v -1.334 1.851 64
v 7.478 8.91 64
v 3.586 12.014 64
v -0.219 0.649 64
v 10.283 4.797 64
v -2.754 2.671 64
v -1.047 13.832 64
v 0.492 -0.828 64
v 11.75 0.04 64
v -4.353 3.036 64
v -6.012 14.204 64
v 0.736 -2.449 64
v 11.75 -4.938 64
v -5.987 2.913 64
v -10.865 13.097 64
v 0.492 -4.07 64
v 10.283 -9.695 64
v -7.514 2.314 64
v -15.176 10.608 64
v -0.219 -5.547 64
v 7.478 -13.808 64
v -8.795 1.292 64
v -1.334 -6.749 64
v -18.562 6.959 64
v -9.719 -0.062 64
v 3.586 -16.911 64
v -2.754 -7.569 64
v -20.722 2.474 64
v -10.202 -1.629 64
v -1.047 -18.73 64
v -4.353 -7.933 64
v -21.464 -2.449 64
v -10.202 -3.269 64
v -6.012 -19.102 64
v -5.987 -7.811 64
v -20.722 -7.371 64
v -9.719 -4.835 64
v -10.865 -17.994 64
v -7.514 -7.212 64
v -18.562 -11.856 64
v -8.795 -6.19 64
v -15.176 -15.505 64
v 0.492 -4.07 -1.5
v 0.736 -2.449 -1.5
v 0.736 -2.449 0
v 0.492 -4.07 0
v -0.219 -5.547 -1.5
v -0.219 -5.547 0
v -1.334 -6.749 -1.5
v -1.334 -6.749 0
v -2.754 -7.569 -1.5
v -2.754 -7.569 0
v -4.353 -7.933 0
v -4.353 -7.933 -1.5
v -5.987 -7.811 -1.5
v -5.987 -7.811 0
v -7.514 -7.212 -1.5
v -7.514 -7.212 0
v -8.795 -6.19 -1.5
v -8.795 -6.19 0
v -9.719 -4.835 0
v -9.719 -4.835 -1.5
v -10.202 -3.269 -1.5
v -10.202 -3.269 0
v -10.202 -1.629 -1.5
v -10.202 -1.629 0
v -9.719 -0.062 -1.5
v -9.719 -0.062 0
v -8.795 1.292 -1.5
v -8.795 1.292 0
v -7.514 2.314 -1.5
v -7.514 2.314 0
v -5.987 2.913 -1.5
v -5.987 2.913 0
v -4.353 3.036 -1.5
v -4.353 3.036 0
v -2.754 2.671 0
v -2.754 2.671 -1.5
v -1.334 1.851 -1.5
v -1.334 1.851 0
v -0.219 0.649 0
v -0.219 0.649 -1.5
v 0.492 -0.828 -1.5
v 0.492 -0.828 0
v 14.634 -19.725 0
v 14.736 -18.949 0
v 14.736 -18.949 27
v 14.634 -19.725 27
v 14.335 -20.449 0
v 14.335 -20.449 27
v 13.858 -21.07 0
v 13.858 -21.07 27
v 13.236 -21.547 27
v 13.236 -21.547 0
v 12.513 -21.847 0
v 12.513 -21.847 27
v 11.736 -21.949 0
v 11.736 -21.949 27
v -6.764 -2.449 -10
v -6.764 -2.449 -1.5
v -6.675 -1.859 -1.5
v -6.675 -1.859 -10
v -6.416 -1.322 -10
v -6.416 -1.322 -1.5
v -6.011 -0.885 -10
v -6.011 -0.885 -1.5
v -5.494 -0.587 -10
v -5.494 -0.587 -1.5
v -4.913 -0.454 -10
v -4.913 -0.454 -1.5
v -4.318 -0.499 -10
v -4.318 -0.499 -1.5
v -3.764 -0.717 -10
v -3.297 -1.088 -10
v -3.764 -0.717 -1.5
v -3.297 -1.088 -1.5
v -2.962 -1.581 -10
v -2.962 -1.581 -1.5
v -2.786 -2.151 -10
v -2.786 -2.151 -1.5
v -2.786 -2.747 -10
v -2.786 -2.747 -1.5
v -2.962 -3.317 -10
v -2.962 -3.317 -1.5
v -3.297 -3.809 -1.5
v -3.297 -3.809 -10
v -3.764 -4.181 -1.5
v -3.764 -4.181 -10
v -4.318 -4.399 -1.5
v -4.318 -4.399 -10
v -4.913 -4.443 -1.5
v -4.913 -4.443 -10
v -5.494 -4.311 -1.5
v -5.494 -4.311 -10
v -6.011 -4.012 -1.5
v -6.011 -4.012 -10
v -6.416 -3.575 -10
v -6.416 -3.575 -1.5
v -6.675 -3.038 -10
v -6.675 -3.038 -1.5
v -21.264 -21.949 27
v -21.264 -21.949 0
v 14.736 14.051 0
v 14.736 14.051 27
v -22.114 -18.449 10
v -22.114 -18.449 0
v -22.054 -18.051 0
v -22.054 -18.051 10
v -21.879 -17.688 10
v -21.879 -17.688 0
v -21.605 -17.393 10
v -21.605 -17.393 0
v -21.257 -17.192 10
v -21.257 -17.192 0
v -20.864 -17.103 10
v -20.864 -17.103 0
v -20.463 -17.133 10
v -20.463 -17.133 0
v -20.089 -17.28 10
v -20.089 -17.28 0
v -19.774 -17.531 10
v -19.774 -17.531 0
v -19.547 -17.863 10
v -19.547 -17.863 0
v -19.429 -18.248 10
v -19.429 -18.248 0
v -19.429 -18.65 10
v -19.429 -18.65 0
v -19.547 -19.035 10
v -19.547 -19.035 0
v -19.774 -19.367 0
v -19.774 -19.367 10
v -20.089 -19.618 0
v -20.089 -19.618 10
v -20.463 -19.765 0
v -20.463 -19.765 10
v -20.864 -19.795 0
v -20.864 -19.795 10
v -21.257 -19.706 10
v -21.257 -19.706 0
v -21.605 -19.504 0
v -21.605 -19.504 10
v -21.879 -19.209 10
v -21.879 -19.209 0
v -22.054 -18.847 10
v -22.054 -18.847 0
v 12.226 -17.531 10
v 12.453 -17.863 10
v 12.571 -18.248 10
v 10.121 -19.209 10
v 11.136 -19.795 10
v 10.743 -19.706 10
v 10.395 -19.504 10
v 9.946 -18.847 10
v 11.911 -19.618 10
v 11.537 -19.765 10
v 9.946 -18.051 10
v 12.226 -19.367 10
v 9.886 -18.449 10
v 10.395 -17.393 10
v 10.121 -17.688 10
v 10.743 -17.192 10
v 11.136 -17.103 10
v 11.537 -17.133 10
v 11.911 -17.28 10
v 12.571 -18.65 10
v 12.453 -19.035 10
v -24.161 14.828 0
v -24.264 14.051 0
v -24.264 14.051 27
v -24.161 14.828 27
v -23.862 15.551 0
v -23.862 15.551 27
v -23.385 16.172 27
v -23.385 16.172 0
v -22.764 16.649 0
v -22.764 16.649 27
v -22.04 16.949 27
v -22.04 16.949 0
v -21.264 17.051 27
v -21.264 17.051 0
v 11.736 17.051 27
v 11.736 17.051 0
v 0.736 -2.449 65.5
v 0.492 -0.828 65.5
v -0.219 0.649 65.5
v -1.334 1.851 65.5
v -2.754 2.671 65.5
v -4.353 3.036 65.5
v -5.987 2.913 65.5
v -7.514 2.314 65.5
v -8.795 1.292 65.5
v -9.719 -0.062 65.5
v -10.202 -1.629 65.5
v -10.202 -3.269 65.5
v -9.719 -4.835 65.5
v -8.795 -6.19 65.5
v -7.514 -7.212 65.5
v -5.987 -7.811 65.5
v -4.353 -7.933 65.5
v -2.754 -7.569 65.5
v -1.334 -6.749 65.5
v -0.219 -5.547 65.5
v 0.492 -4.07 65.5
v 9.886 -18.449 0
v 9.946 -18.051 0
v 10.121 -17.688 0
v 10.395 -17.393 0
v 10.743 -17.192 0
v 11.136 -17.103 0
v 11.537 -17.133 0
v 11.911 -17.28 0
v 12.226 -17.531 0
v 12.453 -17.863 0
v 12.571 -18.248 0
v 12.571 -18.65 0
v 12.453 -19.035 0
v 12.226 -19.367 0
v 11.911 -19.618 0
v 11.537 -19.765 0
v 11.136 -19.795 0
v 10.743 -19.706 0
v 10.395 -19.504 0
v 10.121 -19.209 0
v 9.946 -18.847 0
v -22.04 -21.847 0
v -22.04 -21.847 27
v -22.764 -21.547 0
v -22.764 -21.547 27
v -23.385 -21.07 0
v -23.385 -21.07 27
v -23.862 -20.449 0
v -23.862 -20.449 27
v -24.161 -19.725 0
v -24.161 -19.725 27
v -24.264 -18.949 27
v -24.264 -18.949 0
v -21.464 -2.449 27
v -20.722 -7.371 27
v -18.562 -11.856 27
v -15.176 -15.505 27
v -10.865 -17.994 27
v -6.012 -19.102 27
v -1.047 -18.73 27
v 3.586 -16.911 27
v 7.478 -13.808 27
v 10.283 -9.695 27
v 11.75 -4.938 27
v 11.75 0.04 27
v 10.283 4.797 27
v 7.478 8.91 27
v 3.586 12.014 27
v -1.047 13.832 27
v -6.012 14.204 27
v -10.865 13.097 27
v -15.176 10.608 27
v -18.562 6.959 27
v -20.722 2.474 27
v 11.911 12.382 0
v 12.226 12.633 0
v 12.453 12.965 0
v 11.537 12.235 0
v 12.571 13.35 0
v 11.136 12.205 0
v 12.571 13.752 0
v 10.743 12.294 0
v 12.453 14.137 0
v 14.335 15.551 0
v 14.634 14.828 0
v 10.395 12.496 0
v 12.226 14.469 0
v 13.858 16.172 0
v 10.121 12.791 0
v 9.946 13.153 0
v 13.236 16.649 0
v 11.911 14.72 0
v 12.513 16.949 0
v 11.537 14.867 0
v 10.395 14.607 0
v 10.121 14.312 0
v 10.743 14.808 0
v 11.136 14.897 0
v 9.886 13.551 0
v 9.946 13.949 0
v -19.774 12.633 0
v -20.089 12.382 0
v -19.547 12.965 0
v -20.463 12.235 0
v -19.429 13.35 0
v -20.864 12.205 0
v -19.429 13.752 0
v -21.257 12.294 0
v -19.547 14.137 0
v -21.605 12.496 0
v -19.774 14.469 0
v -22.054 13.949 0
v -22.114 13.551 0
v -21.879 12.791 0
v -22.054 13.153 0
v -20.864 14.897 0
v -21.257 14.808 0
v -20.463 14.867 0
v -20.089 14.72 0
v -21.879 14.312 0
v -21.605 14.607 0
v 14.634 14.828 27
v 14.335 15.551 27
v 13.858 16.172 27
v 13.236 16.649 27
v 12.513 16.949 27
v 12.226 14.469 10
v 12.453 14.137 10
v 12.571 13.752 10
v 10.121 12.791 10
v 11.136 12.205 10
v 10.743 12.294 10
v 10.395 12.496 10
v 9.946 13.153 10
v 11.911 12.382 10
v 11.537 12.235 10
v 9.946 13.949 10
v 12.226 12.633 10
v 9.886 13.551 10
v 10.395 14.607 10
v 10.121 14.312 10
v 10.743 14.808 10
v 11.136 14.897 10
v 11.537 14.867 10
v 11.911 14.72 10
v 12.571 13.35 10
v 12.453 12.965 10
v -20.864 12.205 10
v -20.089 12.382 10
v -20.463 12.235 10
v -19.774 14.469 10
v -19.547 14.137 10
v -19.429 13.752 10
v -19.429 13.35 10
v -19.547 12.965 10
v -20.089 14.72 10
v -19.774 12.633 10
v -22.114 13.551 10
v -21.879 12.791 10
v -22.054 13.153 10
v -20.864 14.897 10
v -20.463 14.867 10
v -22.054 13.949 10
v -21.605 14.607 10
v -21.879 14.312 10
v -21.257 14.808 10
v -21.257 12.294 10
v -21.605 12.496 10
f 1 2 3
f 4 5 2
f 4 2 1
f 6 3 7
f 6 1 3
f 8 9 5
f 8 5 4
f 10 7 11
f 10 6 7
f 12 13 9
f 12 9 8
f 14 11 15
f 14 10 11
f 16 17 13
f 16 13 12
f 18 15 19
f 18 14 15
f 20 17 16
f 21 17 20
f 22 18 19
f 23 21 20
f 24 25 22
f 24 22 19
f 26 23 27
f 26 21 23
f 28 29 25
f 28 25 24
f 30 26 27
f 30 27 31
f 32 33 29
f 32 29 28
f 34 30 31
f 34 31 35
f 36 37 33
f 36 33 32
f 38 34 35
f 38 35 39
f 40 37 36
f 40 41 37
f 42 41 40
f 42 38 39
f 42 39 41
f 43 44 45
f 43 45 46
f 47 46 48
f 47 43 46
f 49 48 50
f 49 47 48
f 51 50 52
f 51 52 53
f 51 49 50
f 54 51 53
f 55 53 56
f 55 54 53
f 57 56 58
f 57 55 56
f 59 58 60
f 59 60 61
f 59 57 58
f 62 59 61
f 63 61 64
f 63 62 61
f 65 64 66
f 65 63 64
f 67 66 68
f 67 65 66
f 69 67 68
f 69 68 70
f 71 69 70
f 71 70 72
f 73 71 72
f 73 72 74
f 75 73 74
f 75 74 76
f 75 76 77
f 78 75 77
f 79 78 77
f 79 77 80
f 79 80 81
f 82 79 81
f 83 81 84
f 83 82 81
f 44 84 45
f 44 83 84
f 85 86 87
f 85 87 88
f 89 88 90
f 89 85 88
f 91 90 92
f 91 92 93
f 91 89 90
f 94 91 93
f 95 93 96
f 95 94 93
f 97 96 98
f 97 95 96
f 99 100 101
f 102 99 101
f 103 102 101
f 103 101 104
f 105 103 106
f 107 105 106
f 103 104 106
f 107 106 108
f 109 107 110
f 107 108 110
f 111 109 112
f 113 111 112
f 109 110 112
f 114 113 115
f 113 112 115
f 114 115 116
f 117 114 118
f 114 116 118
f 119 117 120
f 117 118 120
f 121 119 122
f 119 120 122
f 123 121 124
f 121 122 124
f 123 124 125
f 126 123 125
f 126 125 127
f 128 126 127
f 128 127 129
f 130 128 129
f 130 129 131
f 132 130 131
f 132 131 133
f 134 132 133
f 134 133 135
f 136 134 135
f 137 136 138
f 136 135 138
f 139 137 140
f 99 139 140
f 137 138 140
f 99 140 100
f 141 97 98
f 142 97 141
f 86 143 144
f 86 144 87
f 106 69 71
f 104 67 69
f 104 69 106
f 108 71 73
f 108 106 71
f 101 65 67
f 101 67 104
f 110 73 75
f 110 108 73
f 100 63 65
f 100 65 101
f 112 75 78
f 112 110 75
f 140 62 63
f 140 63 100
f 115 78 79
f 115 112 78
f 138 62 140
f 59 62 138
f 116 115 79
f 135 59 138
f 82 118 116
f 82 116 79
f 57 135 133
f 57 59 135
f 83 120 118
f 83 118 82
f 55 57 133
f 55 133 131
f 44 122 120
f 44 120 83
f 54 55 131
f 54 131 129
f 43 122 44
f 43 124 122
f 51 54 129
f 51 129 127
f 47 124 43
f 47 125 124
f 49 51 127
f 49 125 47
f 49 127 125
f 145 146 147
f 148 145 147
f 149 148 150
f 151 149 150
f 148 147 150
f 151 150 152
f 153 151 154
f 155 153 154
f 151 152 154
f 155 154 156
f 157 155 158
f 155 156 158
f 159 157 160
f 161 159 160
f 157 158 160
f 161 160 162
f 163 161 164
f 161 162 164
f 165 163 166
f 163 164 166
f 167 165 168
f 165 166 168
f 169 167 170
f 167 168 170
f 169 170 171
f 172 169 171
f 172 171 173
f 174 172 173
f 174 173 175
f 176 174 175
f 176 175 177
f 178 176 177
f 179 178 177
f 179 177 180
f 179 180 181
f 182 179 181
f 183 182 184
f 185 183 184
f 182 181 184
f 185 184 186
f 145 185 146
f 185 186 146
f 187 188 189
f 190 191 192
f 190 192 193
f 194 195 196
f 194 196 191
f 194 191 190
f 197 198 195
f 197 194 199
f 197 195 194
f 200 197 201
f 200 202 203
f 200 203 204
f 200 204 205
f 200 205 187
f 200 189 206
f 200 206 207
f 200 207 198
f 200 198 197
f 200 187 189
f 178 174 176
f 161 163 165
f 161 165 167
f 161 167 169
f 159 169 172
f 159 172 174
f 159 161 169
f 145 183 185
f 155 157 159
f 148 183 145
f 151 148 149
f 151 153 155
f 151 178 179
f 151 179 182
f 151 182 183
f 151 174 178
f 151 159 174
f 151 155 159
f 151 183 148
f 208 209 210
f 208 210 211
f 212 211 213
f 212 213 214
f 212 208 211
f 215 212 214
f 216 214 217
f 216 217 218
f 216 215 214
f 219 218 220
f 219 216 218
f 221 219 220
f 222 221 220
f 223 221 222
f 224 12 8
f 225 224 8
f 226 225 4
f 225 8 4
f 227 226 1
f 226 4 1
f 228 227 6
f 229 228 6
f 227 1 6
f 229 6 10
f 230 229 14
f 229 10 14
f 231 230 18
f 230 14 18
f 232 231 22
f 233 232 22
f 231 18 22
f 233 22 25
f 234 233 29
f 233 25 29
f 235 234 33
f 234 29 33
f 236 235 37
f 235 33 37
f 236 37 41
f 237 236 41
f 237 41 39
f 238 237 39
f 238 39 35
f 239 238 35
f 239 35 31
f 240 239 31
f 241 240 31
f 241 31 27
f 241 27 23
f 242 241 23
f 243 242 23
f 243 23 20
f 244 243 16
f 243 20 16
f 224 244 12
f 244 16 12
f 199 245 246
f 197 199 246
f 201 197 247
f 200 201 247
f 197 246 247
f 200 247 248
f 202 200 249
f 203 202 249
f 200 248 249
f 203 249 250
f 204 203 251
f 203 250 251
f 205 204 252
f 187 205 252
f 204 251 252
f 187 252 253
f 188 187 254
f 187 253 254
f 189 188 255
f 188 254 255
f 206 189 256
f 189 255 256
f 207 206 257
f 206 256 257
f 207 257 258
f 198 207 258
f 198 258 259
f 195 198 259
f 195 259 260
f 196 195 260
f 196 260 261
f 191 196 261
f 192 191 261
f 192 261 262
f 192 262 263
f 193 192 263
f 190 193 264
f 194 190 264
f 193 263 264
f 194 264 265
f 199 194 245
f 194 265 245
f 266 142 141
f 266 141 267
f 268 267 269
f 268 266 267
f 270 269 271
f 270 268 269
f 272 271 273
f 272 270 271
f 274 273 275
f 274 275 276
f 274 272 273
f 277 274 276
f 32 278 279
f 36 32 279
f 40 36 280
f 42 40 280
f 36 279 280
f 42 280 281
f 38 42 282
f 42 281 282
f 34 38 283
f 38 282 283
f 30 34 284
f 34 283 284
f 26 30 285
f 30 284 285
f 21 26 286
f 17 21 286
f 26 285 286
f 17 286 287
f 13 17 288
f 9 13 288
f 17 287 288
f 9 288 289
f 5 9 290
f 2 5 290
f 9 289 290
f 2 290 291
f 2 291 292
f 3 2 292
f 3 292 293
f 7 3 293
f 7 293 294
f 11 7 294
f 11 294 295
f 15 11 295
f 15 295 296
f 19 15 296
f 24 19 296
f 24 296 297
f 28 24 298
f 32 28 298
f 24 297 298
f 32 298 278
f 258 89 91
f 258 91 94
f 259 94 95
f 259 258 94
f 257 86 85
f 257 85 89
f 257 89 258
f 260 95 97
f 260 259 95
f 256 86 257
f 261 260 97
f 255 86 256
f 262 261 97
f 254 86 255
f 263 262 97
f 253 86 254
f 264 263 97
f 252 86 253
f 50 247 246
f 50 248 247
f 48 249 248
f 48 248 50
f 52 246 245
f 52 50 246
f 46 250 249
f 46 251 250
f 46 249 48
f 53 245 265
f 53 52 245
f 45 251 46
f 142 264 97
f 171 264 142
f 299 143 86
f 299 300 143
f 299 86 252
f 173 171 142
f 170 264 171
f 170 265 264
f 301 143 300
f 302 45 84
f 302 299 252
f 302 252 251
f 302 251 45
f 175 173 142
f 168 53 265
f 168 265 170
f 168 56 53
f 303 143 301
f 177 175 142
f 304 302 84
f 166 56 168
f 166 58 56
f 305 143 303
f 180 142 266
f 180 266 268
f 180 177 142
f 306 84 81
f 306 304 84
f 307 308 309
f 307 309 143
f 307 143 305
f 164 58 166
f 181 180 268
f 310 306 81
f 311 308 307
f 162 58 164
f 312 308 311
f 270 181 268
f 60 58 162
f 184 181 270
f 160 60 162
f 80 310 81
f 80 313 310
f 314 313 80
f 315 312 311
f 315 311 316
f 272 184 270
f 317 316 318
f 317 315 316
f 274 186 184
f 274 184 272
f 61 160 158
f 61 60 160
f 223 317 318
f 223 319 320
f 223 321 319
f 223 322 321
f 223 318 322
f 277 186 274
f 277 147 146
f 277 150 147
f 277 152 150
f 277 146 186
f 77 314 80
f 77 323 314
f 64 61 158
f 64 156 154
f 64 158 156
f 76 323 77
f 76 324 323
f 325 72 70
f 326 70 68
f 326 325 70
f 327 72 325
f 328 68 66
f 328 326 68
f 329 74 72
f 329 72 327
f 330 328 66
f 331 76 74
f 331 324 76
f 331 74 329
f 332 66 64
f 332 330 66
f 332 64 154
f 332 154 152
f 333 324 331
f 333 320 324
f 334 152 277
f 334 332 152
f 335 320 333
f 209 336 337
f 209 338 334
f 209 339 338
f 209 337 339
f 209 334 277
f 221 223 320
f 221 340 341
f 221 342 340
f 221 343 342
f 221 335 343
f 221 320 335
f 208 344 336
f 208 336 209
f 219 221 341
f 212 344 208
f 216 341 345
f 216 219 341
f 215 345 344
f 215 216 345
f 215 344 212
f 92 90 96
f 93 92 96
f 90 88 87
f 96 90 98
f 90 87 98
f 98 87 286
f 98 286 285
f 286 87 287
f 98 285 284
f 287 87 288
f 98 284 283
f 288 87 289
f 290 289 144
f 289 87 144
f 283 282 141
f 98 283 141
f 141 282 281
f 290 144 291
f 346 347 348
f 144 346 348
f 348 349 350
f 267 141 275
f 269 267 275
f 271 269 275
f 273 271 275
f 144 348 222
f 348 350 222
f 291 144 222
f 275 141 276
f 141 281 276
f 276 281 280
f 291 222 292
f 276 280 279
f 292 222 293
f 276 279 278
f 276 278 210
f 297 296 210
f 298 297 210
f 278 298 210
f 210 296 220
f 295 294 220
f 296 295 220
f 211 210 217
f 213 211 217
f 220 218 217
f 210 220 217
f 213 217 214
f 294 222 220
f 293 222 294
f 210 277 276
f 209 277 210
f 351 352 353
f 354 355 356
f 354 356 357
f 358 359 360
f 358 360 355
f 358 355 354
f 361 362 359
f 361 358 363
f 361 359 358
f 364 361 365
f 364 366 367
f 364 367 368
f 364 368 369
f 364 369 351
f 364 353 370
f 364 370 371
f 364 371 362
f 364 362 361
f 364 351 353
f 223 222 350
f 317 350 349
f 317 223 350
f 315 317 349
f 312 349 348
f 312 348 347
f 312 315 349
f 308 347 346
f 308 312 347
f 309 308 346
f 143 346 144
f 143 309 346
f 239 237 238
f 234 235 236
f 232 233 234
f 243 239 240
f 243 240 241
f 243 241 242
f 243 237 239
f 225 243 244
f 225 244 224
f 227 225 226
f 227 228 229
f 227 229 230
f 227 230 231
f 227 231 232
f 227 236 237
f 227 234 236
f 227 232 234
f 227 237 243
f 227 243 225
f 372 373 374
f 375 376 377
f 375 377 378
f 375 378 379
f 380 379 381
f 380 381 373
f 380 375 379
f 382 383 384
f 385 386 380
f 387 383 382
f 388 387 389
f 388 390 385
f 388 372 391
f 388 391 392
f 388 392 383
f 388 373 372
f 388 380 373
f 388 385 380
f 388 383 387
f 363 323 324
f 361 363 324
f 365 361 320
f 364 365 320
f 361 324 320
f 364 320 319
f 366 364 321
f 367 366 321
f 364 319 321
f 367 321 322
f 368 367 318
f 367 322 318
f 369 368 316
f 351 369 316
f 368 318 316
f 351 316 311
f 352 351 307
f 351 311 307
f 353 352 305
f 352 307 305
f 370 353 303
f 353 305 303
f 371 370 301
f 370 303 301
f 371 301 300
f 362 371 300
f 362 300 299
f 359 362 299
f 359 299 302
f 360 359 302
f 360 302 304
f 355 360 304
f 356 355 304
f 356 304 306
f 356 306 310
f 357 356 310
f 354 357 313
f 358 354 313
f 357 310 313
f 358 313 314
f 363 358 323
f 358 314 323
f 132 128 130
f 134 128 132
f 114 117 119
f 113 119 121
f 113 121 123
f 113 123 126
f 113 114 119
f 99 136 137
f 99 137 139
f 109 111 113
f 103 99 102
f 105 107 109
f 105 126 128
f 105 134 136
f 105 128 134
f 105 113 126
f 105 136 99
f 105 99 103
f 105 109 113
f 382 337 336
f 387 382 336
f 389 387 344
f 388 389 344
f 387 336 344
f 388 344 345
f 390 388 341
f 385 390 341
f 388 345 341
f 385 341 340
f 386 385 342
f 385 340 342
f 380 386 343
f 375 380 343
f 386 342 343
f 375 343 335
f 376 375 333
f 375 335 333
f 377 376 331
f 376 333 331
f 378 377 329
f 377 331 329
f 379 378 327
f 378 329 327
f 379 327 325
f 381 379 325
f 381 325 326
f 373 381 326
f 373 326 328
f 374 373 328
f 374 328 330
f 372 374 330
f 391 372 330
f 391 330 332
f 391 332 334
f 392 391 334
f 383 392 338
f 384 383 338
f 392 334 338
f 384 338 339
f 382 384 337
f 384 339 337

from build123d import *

# Parameters (mm, degrees)
EXTRUSION1_DEPTH = 27
ESQUISSE2_R      = 16.7
EXTRUSION2_DEPTH = 37
ESQUISSE3_R      = 5.5
EXTRUSION3_DEPTH = 1.5
ESQUISSE4_R      = 1.35
EXTRUSION4_DEPTH = 10
EXTRUSION5_START = 1.5
ESQUISSE5_R      = 5.5
EXTRUSION5_DEPTH = 1.5
ESQUISSE6_R      = 2
EXTRUSION6_DEPTH = 8.5


with BuildPart() as part:
    # Esquisse1 → Extrusion1 (new body)
    with BuildSketch(Plane.XY):
        with BuildLine():
            Line((-21.263539738, 17.051170213), (11.736460262, 17.051170213))
            ThreePointArc((11.736460262, 17.051170213), (13.857780605, 16.172490556), (14.736460262, 14.051170213))
            Line((14.736460262, 14.051170213), (14.736460262, -18.948829787))
            ThreePointArc((14.736460262, -18.948829787), (13.857780605, -21.070150131), (11.736460262, -21.948829787))
            Line((11.736460262, -21.948829787), (-21.263539738, -21.948829787))
            ThreePointArc((-21.263539738, -21.948829787), (-23.384860082, -21.070150131), (-24.263539738, -18.948829787))
            Line((-24.263539738, -18.948829787), (-24.263539738, 14.051170213))
            ThreePointArc((-24.263539738, 14.051170213), (-23.384860082, 16.172490556), (-21.263539738, 17.051170213))
        make_face()
    extrude(amount=EXTRUSION1_DEPTH)

    # Esquisse2 → Extrusion2 (add)
    with BuildSketch(Plane.XY.offset(27)):
        with Locations(Location((-4.763539738, -2.448829787, 0), (0, 0, 180))):
            Circle(ESQUISSE2_R)
    extrude(amount=EXTRUSION2_DEPTH)

    # Esquisse3 → Extrusion3 (add)
    with BuildSketch(Plane.XY.offset(64)):
        with Locations((-4.763539738, -2.448829787)):
            Circle(ESQUISSE3_R)
    extrude(amount=EXTRUSION3_DEPTH)

    # Esquisse4 → Extrusion4 (cut)
    with BuildSketch(Plane(origin=(0, 0, 0), x_dir=(-1, 0, 0), z_dir=(0, 0, -1))):
        with Locations((-11.236460262, 13.551170213)):
            Circle(ESQUISSE4_R)
        with Locations((20.763539738, 13.551170213)):
            Circle(ESQUISSE4_R)
        with Locations((20.763539738, -18.448829787)):
            Circle(ESQUISSE4_R)
        with Locations((-11.236460262, -18.448829787)):
            Circle(ESQUISSE4_R)
    extrude(amount=-EXTRUSION4_DEPTH, mode=Mode.SUBTRACT)

    # Esquisse5 → Extrusion5 (add)
    with BuildSketch(Plane(origin=(0, 0, 0), x_dir=(-1, 0, 0), z_dir=(0, 0, -1)).offset(EXTRUSION5_START)):
        with Locations(Location((4.763539738, -2.448829787, 0), (0, 0, 180))):
            Circle(ESQUISSE5_R)
    extrude(amount=-EXTRUSION5_DEPTH)

    # Esquisse6 → Extrusion6 (add)
    with BuildSketch(Plane(origin=(0, 0, -1.5), x_dir=(-1, 0, 0), z_dir=(0, 0, -1))):
        with Locations((4.763539738, -2.448829787)):
            Circle(ESQUISSE6_R)
    extrude(amount=EXTRUSION6_DEPTH)


solid = part.part
